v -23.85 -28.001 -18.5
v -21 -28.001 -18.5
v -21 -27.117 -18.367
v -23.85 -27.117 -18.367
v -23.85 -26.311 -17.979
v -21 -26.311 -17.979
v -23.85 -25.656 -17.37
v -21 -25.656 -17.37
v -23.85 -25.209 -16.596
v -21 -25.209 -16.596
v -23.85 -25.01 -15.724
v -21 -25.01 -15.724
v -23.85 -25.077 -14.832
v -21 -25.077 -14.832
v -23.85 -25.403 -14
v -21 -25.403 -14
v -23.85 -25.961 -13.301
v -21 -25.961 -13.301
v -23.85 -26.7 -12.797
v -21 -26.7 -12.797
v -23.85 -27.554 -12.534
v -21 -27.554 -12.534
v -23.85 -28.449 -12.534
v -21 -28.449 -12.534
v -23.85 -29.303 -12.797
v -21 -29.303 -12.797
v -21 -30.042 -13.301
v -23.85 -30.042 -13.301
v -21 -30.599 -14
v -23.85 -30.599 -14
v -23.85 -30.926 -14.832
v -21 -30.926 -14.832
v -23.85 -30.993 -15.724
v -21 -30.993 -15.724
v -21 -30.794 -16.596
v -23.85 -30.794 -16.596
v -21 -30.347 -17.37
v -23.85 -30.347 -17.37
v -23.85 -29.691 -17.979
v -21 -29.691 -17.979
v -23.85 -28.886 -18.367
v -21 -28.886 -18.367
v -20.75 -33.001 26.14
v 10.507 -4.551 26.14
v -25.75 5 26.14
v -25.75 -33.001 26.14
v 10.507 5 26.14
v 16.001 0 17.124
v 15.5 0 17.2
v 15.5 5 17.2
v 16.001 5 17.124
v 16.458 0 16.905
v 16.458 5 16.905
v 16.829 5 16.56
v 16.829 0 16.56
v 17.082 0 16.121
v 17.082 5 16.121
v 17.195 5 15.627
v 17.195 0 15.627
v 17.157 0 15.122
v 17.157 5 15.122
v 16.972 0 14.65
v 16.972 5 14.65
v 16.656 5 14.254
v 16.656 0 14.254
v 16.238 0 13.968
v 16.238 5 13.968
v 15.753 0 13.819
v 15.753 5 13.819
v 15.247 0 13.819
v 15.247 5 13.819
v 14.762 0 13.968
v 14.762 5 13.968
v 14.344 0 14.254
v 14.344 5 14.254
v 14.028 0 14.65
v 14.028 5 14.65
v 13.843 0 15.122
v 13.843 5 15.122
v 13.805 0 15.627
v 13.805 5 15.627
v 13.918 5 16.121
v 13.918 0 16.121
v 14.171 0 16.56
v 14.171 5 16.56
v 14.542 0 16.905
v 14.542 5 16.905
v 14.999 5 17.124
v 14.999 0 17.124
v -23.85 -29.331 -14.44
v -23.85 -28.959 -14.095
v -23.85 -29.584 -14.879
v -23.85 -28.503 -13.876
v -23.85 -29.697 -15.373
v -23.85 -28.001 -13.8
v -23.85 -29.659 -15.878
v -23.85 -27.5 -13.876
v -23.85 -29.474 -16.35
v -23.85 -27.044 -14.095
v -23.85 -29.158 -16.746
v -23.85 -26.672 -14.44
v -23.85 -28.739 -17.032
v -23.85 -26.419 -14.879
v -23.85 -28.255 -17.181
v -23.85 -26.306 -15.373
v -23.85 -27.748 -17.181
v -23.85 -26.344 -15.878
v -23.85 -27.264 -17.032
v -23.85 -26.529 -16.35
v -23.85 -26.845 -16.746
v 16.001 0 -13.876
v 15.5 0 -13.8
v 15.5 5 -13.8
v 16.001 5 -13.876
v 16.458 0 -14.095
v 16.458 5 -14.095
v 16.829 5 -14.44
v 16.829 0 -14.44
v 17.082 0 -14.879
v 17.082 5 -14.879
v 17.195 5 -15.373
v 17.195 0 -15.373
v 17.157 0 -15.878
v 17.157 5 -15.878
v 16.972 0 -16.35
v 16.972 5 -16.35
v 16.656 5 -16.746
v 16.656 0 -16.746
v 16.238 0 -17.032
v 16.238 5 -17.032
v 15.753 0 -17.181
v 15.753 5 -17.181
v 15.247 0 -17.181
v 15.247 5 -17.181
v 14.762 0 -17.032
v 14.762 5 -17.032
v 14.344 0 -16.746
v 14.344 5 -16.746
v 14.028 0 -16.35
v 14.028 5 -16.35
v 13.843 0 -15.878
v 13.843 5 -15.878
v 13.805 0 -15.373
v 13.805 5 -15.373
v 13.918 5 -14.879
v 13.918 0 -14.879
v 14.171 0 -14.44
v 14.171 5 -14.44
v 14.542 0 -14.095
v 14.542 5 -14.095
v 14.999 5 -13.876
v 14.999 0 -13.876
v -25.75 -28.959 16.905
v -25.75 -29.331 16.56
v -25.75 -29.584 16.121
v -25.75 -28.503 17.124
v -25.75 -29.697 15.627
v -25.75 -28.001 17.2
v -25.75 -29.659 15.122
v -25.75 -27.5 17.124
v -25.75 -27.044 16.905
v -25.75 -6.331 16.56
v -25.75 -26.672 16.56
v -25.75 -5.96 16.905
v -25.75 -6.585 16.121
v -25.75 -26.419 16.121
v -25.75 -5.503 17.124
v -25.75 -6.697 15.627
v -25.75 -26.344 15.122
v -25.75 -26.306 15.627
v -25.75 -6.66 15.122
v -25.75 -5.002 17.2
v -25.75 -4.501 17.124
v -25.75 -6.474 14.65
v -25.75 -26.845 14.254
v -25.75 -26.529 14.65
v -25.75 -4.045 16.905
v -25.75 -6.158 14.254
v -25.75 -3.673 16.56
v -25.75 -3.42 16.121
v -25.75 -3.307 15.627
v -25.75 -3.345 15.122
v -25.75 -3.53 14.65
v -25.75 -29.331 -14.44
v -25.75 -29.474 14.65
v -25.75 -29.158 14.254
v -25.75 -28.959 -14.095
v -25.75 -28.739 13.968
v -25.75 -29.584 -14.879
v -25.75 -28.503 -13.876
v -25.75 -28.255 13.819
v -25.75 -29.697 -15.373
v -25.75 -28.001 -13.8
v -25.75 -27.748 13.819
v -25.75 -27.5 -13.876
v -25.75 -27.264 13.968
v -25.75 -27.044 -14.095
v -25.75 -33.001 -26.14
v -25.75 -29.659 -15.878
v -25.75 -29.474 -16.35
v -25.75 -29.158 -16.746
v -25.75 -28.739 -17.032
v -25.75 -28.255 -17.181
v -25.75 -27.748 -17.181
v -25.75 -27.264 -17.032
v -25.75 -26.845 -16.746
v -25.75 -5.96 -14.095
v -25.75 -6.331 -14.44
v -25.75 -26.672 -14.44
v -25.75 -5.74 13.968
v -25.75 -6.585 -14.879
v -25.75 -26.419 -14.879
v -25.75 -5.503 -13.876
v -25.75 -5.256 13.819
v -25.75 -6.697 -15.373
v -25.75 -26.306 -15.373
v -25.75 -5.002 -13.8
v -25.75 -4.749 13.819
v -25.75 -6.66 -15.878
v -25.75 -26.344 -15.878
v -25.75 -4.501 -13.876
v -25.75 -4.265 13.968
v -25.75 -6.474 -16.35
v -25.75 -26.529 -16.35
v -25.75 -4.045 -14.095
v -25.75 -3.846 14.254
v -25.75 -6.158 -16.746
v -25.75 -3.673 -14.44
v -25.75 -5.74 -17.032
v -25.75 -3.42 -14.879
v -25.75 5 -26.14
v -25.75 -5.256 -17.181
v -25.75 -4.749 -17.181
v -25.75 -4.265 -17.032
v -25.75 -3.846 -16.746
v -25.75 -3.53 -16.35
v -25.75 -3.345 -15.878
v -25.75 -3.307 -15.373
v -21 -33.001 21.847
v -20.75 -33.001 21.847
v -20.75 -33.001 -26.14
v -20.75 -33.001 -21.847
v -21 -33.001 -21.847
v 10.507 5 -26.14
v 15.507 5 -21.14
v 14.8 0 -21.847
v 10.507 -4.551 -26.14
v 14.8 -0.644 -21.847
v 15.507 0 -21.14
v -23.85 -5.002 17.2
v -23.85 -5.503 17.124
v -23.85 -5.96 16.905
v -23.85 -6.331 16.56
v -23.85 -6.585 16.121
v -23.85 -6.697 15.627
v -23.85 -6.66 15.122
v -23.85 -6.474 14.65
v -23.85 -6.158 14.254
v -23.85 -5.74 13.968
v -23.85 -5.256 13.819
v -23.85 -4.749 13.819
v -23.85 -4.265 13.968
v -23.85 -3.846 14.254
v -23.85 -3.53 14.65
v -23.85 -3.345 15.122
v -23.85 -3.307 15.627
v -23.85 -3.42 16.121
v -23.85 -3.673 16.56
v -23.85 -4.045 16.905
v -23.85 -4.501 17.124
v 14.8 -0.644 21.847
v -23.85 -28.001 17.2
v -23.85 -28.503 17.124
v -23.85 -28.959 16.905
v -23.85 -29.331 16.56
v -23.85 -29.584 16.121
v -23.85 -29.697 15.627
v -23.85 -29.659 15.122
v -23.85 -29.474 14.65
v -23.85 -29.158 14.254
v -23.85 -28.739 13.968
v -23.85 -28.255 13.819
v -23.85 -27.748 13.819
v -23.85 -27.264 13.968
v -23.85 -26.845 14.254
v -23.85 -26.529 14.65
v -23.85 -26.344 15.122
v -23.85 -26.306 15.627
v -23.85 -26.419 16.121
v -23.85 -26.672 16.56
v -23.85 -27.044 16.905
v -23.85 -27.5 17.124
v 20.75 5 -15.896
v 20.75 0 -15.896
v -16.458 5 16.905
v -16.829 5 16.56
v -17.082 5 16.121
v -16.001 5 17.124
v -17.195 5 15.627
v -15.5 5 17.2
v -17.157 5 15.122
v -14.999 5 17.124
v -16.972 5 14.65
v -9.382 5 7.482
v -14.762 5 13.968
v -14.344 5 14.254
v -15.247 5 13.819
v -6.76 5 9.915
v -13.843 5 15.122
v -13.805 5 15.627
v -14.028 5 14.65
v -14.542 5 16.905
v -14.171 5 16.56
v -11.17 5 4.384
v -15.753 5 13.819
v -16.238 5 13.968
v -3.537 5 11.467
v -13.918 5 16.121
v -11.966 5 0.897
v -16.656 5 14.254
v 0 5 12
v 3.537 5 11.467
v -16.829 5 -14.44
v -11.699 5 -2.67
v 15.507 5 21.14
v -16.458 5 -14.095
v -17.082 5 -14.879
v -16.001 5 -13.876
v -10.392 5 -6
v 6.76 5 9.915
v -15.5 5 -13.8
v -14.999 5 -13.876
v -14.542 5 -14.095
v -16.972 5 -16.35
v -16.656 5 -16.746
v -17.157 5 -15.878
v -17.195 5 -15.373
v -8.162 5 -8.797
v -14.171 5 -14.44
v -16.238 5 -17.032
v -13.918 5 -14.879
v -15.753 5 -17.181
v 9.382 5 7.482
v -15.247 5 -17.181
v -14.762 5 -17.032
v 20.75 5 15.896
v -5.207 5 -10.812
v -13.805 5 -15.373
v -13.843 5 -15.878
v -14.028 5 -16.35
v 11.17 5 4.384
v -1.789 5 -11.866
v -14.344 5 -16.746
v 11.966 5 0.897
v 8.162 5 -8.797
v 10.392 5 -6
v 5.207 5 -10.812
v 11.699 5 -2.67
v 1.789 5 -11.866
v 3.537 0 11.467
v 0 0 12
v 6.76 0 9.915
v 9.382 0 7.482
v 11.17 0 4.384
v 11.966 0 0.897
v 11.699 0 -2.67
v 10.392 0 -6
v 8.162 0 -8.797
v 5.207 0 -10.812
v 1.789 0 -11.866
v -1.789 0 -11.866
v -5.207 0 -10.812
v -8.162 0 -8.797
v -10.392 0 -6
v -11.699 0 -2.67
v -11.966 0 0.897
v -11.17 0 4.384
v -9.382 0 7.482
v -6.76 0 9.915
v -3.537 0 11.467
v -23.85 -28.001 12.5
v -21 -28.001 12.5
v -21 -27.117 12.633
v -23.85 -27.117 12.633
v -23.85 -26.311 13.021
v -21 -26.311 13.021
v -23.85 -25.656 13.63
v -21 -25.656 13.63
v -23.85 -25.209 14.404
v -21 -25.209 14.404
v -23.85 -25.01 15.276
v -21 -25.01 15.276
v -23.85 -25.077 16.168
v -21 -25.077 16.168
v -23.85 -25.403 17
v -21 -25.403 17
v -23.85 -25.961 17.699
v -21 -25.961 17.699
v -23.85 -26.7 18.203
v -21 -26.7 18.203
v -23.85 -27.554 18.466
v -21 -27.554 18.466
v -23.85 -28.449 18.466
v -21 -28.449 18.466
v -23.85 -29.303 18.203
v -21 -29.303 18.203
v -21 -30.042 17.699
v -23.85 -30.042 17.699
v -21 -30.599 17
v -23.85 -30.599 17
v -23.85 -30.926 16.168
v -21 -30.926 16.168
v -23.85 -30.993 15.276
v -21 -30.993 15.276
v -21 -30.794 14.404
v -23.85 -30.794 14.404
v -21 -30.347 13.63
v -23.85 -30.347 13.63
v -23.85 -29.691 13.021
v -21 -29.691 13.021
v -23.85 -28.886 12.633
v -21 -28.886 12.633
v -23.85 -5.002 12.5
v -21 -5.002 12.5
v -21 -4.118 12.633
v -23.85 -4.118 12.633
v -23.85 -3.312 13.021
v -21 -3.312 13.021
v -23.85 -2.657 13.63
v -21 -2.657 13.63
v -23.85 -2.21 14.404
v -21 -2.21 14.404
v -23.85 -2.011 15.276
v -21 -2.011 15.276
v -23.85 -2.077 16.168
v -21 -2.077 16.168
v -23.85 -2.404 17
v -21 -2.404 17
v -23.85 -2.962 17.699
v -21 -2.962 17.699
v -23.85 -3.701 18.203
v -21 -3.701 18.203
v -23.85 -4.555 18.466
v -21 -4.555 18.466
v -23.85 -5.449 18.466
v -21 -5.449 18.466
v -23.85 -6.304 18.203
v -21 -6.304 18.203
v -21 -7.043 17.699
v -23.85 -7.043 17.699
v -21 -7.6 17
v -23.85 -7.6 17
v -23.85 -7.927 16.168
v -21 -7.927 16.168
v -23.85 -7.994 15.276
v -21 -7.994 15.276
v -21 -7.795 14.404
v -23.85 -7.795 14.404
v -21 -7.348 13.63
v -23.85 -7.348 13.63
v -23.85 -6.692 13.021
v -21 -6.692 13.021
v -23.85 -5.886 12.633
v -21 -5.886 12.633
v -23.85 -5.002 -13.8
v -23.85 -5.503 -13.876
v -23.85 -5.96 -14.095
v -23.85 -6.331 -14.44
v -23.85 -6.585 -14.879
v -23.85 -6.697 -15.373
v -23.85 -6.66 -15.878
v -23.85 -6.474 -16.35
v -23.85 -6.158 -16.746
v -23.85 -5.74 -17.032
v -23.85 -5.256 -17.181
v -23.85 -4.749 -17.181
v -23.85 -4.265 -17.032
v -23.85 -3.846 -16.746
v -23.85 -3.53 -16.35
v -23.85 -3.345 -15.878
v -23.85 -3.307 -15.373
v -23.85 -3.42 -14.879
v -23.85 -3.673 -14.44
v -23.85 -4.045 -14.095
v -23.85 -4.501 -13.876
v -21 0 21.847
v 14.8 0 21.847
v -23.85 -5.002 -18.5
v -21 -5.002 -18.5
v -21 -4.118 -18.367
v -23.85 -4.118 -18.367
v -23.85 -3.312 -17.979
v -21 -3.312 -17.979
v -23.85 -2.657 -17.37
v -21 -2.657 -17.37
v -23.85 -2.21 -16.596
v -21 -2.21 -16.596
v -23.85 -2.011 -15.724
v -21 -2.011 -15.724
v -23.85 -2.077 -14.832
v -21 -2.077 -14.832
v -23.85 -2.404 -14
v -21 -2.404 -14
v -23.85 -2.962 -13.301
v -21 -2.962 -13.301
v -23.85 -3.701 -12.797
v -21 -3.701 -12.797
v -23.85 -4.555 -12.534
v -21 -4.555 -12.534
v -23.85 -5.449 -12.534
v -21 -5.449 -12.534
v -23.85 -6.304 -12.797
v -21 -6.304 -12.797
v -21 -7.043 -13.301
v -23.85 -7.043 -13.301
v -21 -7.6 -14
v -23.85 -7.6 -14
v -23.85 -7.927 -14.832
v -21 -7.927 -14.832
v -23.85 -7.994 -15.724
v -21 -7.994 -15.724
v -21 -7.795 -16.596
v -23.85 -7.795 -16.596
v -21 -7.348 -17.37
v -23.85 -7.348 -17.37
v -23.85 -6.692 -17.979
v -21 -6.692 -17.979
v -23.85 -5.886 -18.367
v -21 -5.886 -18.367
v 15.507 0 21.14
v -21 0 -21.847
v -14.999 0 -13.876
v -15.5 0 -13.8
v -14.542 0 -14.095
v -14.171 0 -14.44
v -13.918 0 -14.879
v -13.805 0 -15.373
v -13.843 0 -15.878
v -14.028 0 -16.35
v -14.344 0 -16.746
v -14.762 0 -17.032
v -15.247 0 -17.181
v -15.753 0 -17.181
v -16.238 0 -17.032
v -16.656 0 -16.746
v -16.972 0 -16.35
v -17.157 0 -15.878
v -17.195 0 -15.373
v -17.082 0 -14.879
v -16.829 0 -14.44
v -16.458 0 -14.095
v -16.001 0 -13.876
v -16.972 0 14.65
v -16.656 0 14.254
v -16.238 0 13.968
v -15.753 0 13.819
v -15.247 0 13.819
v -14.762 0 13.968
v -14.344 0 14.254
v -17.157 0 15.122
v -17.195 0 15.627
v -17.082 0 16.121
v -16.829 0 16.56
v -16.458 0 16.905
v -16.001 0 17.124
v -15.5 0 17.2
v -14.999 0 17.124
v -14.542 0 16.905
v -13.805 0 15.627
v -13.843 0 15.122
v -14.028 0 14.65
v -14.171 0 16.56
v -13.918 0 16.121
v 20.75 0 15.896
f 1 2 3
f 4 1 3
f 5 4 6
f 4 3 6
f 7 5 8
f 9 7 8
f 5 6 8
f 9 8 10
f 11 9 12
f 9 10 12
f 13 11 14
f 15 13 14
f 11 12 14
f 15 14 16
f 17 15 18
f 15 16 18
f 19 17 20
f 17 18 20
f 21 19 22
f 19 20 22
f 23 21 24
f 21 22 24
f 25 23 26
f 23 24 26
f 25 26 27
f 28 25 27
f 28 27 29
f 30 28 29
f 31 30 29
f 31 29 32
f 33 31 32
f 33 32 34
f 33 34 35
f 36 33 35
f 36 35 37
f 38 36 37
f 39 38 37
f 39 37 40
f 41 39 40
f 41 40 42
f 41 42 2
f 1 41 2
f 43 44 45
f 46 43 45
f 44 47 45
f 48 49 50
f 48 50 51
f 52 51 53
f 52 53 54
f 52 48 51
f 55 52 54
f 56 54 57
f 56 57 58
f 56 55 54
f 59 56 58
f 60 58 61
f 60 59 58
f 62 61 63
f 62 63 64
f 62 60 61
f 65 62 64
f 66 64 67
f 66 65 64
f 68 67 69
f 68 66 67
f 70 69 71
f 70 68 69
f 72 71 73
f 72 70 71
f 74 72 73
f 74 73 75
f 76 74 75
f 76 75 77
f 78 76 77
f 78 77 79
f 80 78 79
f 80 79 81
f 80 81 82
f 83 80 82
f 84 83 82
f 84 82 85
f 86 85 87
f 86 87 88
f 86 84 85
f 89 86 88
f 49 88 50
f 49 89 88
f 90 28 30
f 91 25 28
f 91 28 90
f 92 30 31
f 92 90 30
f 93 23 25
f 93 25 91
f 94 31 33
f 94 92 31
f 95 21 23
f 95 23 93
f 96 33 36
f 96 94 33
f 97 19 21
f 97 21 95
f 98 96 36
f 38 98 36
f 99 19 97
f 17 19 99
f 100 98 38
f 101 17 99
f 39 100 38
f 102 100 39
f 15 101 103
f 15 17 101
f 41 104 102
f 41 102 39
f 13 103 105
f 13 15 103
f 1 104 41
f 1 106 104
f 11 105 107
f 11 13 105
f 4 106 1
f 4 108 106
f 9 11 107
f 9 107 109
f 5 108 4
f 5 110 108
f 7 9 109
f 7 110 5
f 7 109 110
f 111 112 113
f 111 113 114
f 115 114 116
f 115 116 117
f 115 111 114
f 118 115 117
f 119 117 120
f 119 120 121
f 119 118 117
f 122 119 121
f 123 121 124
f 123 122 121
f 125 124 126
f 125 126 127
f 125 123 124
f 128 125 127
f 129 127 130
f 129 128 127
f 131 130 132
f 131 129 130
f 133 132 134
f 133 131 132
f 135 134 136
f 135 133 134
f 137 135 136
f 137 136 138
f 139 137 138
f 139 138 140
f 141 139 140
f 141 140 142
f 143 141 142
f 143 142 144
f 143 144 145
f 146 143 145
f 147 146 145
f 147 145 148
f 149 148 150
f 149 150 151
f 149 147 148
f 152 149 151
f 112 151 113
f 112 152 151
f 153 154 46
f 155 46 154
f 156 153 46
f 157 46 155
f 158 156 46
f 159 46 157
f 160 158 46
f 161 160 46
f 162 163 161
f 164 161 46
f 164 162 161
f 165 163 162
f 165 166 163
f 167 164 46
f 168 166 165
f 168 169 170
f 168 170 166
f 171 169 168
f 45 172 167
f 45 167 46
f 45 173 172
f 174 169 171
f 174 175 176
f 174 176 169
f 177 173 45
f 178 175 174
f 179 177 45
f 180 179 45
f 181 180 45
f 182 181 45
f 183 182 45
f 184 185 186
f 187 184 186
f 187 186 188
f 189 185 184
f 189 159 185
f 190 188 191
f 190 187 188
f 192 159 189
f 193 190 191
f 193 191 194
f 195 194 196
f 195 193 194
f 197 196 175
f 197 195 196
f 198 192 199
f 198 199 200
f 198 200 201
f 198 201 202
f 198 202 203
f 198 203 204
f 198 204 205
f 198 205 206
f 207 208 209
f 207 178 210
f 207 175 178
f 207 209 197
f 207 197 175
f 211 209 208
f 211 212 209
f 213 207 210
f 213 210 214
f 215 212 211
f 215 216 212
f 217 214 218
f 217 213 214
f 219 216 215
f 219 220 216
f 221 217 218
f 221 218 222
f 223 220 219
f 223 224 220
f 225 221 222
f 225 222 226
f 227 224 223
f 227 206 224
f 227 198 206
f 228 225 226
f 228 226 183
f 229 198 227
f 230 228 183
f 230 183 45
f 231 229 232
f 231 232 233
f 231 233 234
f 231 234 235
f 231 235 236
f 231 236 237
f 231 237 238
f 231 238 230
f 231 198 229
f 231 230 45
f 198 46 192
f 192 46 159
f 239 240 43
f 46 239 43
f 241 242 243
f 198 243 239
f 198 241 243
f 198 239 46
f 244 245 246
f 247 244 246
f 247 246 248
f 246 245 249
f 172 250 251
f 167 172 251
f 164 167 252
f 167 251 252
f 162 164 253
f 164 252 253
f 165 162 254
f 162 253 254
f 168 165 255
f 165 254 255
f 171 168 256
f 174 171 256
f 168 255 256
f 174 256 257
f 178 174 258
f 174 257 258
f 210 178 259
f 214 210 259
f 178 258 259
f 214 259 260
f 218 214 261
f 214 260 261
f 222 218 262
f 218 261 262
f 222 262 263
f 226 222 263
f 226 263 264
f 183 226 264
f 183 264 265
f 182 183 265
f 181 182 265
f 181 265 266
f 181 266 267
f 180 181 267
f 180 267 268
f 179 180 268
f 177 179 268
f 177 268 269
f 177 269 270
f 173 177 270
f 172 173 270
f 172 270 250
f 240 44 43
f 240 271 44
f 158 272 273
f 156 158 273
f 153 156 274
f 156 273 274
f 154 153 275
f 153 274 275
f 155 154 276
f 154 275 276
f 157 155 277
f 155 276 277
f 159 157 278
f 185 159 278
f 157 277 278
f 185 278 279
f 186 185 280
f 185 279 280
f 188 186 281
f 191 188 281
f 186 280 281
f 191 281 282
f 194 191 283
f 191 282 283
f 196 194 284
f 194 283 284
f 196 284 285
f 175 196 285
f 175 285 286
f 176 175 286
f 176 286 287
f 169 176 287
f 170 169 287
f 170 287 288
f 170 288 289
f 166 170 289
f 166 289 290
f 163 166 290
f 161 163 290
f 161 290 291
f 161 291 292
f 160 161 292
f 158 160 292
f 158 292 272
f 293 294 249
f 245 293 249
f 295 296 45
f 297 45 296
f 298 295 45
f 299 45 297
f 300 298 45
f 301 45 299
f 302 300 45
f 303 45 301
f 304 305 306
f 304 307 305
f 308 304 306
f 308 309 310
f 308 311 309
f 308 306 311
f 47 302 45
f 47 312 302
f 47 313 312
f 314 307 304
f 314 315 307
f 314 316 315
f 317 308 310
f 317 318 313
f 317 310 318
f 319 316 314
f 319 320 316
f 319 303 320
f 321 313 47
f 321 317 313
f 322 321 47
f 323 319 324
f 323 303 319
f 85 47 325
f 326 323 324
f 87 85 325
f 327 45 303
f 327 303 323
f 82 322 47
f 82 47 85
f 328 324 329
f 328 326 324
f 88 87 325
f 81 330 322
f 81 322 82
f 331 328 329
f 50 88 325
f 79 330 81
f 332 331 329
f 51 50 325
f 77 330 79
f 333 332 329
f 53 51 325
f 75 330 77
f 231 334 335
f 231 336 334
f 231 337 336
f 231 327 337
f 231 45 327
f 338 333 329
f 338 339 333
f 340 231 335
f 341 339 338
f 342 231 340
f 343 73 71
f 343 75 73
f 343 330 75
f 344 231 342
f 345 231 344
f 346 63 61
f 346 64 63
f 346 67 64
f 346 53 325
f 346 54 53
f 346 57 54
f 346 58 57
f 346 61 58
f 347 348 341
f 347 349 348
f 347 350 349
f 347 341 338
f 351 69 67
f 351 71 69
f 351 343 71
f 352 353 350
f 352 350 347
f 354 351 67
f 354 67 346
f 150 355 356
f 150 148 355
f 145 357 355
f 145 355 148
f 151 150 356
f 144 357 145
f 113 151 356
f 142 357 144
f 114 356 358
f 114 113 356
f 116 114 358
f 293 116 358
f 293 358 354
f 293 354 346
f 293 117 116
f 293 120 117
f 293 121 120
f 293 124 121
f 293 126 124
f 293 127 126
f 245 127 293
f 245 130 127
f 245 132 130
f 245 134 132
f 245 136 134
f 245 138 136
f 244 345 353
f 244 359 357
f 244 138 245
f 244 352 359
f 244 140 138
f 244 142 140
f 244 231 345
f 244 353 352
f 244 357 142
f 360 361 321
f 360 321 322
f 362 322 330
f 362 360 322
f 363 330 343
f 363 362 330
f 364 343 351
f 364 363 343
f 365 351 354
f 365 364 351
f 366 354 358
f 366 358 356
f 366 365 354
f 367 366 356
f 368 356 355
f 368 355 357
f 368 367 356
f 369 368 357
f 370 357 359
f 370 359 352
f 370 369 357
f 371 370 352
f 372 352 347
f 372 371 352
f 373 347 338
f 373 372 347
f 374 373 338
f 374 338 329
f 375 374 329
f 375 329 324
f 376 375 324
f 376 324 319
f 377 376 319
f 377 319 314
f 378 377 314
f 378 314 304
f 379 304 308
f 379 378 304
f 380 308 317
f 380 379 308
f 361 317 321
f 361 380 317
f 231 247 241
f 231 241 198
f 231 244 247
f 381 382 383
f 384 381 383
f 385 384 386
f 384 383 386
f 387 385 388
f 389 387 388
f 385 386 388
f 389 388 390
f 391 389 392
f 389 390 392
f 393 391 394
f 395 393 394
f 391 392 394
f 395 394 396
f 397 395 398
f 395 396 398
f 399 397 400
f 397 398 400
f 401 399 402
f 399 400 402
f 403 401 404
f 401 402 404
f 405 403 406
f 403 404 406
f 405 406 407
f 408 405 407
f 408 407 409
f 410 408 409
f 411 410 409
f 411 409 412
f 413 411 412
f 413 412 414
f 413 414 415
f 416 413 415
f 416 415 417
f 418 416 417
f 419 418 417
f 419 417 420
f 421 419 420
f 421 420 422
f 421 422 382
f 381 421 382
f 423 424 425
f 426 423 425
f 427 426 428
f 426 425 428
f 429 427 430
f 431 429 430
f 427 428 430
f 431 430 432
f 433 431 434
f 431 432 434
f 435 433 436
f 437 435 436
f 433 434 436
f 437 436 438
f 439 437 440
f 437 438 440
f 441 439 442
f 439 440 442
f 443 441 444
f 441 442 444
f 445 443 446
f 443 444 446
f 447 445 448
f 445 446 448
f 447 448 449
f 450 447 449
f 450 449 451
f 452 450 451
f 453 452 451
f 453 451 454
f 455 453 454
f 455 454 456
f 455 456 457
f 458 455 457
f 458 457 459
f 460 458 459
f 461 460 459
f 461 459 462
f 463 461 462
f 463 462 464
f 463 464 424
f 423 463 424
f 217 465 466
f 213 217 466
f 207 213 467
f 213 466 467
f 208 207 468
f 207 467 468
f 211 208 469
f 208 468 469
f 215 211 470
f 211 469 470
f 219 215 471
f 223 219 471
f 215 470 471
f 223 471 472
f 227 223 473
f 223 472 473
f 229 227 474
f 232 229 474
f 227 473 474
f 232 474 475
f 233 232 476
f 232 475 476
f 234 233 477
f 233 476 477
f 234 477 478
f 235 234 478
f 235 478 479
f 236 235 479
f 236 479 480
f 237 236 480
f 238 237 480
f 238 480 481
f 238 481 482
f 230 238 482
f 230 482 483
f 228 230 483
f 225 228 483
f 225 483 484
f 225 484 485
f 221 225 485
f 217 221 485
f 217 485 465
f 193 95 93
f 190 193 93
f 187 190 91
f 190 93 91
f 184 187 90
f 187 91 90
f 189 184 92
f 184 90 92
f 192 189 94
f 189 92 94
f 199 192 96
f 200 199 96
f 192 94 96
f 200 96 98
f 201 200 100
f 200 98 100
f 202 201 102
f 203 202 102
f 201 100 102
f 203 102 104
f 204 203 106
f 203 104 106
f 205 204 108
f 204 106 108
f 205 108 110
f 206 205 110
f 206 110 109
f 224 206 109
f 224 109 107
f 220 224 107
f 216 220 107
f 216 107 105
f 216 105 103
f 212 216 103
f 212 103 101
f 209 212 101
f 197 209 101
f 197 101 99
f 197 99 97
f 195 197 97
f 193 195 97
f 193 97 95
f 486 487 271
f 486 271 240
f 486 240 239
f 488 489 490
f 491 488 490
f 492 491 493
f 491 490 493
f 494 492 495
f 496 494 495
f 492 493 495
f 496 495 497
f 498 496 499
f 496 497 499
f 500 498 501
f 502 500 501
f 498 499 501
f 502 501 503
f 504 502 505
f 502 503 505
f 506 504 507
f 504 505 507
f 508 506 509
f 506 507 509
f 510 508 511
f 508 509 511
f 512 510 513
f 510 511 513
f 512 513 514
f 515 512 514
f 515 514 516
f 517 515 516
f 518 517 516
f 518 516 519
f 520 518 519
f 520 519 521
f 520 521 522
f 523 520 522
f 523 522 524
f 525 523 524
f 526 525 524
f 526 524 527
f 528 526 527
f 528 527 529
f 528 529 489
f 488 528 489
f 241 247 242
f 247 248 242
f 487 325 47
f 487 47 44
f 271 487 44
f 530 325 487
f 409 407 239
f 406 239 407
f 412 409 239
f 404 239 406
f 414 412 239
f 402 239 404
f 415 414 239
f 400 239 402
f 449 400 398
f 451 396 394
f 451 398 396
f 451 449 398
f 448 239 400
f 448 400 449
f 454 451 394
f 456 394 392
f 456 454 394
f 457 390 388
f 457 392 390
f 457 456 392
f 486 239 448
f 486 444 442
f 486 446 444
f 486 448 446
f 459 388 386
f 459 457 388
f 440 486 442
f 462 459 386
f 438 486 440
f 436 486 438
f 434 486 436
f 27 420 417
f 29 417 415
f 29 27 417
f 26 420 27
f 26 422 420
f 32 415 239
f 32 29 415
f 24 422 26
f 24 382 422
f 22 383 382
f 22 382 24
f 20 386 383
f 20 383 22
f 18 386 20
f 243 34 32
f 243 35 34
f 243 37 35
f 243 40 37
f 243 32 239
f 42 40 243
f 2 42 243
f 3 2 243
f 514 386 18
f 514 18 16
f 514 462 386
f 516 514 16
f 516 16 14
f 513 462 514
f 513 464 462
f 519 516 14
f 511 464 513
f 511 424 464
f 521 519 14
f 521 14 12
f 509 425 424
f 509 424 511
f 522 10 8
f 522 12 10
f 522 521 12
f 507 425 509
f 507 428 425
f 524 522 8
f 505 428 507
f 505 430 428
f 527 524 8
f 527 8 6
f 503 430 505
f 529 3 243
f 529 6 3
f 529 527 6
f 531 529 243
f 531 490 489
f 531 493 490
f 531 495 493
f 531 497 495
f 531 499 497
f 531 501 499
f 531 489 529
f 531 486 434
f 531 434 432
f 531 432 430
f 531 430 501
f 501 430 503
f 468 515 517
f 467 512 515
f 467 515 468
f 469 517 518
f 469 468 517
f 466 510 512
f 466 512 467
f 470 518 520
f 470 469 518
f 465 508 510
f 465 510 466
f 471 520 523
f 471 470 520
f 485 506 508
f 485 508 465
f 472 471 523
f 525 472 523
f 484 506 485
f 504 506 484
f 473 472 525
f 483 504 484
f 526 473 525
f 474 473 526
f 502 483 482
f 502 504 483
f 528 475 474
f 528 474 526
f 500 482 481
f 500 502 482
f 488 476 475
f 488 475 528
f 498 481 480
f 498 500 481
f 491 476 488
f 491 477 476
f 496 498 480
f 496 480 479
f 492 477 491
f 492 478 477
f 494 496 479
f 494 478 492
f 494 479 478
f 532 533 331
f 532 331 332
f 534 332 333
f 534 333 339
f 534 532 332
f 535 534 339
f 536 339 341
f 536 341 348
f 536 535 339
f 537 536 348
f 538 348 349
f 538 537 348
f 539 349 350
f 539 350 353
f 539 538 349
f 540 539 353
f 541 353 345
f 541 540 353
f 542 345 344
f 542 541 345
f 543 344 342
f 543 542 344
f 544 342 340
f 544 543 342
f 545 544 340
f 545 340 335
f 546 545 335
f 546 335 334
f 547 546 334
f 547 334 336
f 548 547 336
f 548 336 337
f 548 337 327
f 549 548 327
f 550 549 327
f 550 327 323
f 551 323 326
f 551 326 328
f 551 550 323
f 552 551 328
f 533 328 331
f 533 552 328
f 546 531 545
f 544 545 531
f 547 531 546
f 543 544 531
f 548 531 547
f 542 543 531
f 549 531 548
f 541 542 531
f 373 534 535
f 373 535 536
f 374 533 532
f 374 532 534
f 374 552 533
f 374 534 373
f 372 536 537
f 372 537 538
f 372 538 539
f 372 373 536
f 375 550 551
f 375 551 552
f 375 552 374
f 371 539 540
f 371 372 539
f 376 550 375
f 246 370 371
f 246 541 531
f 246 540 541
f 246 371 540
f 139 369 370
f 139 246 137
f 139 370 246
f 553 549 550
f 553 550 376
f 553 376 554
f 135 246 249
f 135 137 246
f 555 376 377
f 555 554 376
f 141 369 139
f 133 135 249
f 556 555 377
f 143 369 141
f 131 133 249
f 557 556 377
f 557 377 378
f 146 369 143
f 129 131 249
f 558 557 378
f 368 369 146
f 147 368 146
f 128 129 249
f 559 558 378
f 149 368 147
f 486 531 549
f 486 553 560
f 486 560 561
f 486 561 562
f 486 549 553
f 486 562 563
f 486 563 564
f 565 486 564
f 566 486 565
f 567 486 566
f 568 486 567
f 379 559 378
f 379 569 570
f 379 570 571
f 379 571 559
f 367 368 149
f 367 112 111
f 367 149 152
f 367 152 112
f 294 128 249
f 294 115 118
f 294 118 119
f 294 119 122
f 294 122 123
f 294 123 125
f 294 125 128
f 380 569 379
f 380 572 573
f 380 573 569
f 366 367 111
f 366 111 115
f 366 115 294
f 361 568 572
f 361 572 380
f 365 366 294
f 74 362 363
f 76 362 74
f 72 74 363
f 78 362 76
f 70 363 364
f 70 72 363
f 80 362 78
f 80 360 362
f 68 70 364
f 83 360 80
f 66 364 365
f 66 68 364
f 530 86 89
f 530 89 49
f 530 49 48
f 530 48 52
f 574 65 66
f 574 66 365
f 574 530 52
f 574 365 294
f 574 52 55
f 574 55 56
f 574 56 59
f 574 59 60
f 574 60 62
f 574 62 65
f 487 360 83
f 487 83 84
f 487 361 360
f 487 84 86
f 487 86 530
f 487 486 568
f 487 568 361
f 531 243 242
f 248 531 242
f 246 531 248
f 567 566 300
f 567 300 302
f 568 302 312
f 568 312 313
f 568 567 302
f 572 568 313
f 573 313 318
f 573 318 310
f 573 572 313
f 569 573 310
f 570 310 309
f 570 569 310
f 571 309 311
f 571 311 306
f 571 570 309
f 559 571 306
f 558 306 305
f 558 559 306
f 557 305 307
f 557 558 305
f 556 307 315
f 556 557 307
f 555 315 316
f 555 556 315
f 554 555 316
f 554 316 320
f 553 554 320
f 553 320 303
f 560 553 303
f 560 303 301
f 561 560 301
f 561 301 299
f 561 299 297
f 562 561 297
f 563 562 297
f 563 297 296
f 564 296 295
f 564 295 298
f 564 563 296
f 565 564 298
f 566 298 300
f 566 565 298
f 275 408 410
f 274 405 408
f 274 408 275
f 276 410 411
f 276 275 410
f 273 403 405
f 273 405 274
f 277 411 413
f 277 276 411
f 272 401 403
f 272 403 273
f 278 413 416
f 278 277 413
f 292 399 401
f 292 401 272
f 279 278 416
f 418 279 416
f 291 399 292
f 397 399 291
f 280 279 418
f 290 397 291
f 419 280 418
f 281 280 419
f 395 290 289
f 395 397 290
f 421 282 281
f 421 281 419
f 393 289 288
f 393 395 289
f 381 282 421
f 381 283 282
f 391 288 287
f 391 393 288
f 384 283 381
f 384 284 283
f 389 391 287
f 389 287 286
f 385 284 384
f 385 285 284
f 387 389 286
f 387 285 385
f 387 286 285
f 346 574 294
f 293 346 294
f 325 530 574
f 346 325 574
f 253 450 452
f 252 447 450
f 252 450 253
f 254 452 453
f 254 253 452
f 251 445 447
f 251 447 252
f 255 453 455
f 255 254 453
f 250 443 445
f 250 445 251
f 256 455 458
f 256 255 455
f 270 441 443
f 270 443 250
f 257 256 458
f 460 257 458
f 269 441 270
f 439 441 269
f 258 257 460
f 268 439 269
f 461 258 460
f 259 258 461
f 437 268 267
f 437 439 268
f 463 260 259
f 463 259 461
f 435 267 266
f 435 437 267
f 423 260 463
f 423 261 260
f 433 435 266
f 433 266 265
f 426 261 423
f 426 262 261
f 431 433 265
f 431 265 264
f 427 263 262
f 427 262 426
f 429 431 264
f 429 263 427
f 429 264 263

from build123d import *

# Parameters (mm, degrees)
SKETCH1_R                = 12
SKETCH1_R_2              = 1.7
BOSS_EXTRUDE1_DEPTH      = 5
BOSS_EXTRUDE3_DEPTH      = 5
BOSS_EXTRUDE4_DEPTH      = 5
CHAMFER1_SIZE            = 5
CHAMFER1_OF_MIRROR1_SIZE = 5
SKETCH7_R                = 3
CUT_EXTRUDE1_DEPTH       = 3.1
CUT_EXTRUDE2_DEPTH       = 33.001420077


# Read off the part's stored shape, not the designer's step: Cut-Extrude2
with BuildPart() as part:
    # Sketch1 → Boss-Extrude1 (new body)
    with BuildSketch(Plane(origin=(0, 0, 0), x_dir=(1, 0, 0), z_dir=(0, 1, 0))):
        Polygon((-20.75, 21.139640519), (-20.75, -21.139640519), (15.50680609, -21.139640519), (20.75, -15.896446609), (20.75, 15.896446609), (15.50680609, 21.139640519), align=None)
        with Locations(Location((0, 0, 0), (0, 0, 270))):
            Circle(SKETCH1_R, mode=Mode.SUBTRACT)
        with Locations(Location((15.5, 15.5, 0), (0, 0, 270))):
            Circle(SKETCH1_R_2, mode=Mode.SUBTRACT)
        with Locations(Location((-15.5, -15.5, 0), (0, 0, 270))):
            Circle(SKETCH1_R_2, mode=Mode.SUBTRACT)
        with Locations(Location((15.5, -15.5, 0), (0, 0, 270))):
            Circle(SKETCH1_R_2, mode=Mode.SUBTRACT)
        with Locations(Location((-15.5, 15.5, 0), (0, 0, 270))):
            Circle(SKETCH1_R_2, mode=Mode.SUBTRACT)
    extrude(amount=BOSS_EXTRUDE1_DEPTH)

    # Sketch3 → Boss-Extrude3 (add)
    with BuildSketch(Plane(origin=(-20.75, 0.364318818, 0), x_dir=(0, 0, 1), z_dir=(-1, 0, 0))):
        Polygon((-21.139640519, 4.635681182), (-21.139640519, 4.634261105), (-21.139640519, -0.364318818), (21.139640519, -0.364318818), (21.139640519, 4.634261105), (21.139640519, 4.635681182), align=None)
        with BuildLine():
            Line((21.139640519, -0.364318818), (-21.139640519, -0.364318818))
            Line((-21.139640519, -0.364318818), (-21.139640519, -5.366500535))
            Line((-21.139640519, -5.366500535), (-17.2, -5.366500535))
            ThreePointArc((-17.2, -5.366500535), (-15.5, -3.666500535), (-13.8, -5.366500535))
            Line((-13.8, -5.366500535), (13.8, -5.366500535))
            ThreePointArc((13.8, -5.366500535), (15.5, -3.666500535), (17.2, -5.366500535))
            Line((17.2, -5.366500535), (21.139640519, -5.366500535))
            Line((21.139640519, -5.366500535), (21.139640519, -0.364318818))
        make_face()
        with BuildLine():
            Line((-17.2, -5.366500535), (-21.139640519, -5.366500535))
            Line((-21.139640519, -5.366500535), (-21.139640519, -28.365738895))
            Line((-21.139640519, -28.365738895), (-17.2, -28.365738895))
            ThreePointArc((-17.2, -28.365738895), (-15.5, -26.665738895), (-13.8, -28.365738895))
            Line((-13.8, -28.365738895), (13.8, -28.365738895))
            ThreePointArc((13.8, -28.365738895), (15.5, -26.665738895), (17.2, -28.365738895))
            Line((17.2, -28.365738895), (21.139640519, -28.365738895))
            Line((21.139640519, -28.365738895), (21.139640519, -5.366500535))
            Line((21.139640519, -5.366500535), (17.2, -5.366500535))
            ThreePointArc((17.2, -5.366500535), (15.5, -7.066500535), (13.8, -5.366500535))
            Line((13.8, -5.366500535), (-13.8, -5.366500535))
            ThreePointArc((-13.8, -5.366500535), (-15.5, -7.066500535), (-17.2, -5.366500535))
        make_face()
        with BuildLine():
            Line((-17.2, -28.365738895), (-21.139640519, -28.365738895))
            Line((-21.139640519, -28.365738895), (-21.139640519, -33.365738895))
            Line((-21.139640519, -33.365738895), (21.139640519, -33.365738895))
            Line((21.139640519, -33.365738895), (21.139640519, -28.365738895))
            Line((21.139640519, -28.365738895), (17.2, -28.365738895))
            ThreePointArc((17.2, -28.365738895), (15.5, -30.065738895), (13.8, -28.365738895))
            Line((13.8, -28.365738895), (-13.8, -28.365738895))
            ThreePointArc((-13.8, -28.365738895), (-15.5, -30.065738895), (-17.2, -28.365738895))
        make_face()
    extrude(amount=BOSS_EXTRUDE3_DEPTH)

    # Sketch6 → Boss-Extrude4 (add)
    with BuildSketch(Plane(origin=(0, 0, -21.139640519), x_dir=(-1, 0, 0), z_dir=(0, 0, -1))):
        Polygon((-15.50680609, 0), (20.75, -33.001420077), (25.75, -33.001420077), (25.75, 5), (-15.50680609, 5), align=None)
    boss_extrude4 = extrude(amount=BOSS_EXTRUDE4_DEPTH)

    # Chamfer1
    chamfer1_edges = [part.edges().sort_by_distance(p)[0] for p in [
        (15.50680609, 2.5, -26.139640519),
    ]]
    chamfer(chamfer1_edges, length=CHAMFER1_SIZE - 0.0001)  # a hair under: the kernel refuses the full size

    # Mirror1: Boss-Extrude4 across plane
    add(boss_extrude4.mirror(Plane(origin=(0, 0, 0), x_dir=(1, 0, 0), z_dir=(0, 0, -1))))

    # Chamfer1 of Mirror1
    chamfer1_of_mirror1_edges = [part.edges().sort_by_distance(p)[0] for p in [
        (15.50680609, 2.5, 26.139640519),
    ]]
    chamfer(chamfer1_of_mirror1_edges, length=CHAMFER1_OF_MIRROR1_SIZE - 0.0001)  # a hair under: the kernel refuses the full size

    # Sketch7 → Cut-Extrude1 (cut)
    with BuildSketch(Plane(origin=(-20.75, 0, 0), x_dir=(0, 0, -1), z_dir=(1, 0, 0))):
        with Locations((-15.5, -5.002181717)):
            Circle(SKETCH7_R)
        with Locations((15.5, -5.002181717)):
            Circle(SKETCH7_R)
        with Locations((-15.5, -28.001420077)):
            Circle(SKETCH7_R)
        with Locations((15.5, -28.001420077)):
            Circle(SKETCH7_R)
    extrude(amount=-CUT_EXTRUDE1_DEPTH, mode=Mode.SUBTRACT)

    # Cut-Extrude2 outline → Cut-Extrude2 (cut)
    with BuildSketch(Plane.XZ):
        Polygon((-21, 21.846747301), (-21, -21.846747301), (17, -21.846747301), (17, -21.139640519), (-20.75, -21.139640519), (-20.75, 21.139640519), (17, 21.139640519), (17, 21.846747301), align=None)
    extrude(amount=CUT_EXTRUDE2_DEPTH, mode=Mode.SUBTRACT)


solid = part.part
